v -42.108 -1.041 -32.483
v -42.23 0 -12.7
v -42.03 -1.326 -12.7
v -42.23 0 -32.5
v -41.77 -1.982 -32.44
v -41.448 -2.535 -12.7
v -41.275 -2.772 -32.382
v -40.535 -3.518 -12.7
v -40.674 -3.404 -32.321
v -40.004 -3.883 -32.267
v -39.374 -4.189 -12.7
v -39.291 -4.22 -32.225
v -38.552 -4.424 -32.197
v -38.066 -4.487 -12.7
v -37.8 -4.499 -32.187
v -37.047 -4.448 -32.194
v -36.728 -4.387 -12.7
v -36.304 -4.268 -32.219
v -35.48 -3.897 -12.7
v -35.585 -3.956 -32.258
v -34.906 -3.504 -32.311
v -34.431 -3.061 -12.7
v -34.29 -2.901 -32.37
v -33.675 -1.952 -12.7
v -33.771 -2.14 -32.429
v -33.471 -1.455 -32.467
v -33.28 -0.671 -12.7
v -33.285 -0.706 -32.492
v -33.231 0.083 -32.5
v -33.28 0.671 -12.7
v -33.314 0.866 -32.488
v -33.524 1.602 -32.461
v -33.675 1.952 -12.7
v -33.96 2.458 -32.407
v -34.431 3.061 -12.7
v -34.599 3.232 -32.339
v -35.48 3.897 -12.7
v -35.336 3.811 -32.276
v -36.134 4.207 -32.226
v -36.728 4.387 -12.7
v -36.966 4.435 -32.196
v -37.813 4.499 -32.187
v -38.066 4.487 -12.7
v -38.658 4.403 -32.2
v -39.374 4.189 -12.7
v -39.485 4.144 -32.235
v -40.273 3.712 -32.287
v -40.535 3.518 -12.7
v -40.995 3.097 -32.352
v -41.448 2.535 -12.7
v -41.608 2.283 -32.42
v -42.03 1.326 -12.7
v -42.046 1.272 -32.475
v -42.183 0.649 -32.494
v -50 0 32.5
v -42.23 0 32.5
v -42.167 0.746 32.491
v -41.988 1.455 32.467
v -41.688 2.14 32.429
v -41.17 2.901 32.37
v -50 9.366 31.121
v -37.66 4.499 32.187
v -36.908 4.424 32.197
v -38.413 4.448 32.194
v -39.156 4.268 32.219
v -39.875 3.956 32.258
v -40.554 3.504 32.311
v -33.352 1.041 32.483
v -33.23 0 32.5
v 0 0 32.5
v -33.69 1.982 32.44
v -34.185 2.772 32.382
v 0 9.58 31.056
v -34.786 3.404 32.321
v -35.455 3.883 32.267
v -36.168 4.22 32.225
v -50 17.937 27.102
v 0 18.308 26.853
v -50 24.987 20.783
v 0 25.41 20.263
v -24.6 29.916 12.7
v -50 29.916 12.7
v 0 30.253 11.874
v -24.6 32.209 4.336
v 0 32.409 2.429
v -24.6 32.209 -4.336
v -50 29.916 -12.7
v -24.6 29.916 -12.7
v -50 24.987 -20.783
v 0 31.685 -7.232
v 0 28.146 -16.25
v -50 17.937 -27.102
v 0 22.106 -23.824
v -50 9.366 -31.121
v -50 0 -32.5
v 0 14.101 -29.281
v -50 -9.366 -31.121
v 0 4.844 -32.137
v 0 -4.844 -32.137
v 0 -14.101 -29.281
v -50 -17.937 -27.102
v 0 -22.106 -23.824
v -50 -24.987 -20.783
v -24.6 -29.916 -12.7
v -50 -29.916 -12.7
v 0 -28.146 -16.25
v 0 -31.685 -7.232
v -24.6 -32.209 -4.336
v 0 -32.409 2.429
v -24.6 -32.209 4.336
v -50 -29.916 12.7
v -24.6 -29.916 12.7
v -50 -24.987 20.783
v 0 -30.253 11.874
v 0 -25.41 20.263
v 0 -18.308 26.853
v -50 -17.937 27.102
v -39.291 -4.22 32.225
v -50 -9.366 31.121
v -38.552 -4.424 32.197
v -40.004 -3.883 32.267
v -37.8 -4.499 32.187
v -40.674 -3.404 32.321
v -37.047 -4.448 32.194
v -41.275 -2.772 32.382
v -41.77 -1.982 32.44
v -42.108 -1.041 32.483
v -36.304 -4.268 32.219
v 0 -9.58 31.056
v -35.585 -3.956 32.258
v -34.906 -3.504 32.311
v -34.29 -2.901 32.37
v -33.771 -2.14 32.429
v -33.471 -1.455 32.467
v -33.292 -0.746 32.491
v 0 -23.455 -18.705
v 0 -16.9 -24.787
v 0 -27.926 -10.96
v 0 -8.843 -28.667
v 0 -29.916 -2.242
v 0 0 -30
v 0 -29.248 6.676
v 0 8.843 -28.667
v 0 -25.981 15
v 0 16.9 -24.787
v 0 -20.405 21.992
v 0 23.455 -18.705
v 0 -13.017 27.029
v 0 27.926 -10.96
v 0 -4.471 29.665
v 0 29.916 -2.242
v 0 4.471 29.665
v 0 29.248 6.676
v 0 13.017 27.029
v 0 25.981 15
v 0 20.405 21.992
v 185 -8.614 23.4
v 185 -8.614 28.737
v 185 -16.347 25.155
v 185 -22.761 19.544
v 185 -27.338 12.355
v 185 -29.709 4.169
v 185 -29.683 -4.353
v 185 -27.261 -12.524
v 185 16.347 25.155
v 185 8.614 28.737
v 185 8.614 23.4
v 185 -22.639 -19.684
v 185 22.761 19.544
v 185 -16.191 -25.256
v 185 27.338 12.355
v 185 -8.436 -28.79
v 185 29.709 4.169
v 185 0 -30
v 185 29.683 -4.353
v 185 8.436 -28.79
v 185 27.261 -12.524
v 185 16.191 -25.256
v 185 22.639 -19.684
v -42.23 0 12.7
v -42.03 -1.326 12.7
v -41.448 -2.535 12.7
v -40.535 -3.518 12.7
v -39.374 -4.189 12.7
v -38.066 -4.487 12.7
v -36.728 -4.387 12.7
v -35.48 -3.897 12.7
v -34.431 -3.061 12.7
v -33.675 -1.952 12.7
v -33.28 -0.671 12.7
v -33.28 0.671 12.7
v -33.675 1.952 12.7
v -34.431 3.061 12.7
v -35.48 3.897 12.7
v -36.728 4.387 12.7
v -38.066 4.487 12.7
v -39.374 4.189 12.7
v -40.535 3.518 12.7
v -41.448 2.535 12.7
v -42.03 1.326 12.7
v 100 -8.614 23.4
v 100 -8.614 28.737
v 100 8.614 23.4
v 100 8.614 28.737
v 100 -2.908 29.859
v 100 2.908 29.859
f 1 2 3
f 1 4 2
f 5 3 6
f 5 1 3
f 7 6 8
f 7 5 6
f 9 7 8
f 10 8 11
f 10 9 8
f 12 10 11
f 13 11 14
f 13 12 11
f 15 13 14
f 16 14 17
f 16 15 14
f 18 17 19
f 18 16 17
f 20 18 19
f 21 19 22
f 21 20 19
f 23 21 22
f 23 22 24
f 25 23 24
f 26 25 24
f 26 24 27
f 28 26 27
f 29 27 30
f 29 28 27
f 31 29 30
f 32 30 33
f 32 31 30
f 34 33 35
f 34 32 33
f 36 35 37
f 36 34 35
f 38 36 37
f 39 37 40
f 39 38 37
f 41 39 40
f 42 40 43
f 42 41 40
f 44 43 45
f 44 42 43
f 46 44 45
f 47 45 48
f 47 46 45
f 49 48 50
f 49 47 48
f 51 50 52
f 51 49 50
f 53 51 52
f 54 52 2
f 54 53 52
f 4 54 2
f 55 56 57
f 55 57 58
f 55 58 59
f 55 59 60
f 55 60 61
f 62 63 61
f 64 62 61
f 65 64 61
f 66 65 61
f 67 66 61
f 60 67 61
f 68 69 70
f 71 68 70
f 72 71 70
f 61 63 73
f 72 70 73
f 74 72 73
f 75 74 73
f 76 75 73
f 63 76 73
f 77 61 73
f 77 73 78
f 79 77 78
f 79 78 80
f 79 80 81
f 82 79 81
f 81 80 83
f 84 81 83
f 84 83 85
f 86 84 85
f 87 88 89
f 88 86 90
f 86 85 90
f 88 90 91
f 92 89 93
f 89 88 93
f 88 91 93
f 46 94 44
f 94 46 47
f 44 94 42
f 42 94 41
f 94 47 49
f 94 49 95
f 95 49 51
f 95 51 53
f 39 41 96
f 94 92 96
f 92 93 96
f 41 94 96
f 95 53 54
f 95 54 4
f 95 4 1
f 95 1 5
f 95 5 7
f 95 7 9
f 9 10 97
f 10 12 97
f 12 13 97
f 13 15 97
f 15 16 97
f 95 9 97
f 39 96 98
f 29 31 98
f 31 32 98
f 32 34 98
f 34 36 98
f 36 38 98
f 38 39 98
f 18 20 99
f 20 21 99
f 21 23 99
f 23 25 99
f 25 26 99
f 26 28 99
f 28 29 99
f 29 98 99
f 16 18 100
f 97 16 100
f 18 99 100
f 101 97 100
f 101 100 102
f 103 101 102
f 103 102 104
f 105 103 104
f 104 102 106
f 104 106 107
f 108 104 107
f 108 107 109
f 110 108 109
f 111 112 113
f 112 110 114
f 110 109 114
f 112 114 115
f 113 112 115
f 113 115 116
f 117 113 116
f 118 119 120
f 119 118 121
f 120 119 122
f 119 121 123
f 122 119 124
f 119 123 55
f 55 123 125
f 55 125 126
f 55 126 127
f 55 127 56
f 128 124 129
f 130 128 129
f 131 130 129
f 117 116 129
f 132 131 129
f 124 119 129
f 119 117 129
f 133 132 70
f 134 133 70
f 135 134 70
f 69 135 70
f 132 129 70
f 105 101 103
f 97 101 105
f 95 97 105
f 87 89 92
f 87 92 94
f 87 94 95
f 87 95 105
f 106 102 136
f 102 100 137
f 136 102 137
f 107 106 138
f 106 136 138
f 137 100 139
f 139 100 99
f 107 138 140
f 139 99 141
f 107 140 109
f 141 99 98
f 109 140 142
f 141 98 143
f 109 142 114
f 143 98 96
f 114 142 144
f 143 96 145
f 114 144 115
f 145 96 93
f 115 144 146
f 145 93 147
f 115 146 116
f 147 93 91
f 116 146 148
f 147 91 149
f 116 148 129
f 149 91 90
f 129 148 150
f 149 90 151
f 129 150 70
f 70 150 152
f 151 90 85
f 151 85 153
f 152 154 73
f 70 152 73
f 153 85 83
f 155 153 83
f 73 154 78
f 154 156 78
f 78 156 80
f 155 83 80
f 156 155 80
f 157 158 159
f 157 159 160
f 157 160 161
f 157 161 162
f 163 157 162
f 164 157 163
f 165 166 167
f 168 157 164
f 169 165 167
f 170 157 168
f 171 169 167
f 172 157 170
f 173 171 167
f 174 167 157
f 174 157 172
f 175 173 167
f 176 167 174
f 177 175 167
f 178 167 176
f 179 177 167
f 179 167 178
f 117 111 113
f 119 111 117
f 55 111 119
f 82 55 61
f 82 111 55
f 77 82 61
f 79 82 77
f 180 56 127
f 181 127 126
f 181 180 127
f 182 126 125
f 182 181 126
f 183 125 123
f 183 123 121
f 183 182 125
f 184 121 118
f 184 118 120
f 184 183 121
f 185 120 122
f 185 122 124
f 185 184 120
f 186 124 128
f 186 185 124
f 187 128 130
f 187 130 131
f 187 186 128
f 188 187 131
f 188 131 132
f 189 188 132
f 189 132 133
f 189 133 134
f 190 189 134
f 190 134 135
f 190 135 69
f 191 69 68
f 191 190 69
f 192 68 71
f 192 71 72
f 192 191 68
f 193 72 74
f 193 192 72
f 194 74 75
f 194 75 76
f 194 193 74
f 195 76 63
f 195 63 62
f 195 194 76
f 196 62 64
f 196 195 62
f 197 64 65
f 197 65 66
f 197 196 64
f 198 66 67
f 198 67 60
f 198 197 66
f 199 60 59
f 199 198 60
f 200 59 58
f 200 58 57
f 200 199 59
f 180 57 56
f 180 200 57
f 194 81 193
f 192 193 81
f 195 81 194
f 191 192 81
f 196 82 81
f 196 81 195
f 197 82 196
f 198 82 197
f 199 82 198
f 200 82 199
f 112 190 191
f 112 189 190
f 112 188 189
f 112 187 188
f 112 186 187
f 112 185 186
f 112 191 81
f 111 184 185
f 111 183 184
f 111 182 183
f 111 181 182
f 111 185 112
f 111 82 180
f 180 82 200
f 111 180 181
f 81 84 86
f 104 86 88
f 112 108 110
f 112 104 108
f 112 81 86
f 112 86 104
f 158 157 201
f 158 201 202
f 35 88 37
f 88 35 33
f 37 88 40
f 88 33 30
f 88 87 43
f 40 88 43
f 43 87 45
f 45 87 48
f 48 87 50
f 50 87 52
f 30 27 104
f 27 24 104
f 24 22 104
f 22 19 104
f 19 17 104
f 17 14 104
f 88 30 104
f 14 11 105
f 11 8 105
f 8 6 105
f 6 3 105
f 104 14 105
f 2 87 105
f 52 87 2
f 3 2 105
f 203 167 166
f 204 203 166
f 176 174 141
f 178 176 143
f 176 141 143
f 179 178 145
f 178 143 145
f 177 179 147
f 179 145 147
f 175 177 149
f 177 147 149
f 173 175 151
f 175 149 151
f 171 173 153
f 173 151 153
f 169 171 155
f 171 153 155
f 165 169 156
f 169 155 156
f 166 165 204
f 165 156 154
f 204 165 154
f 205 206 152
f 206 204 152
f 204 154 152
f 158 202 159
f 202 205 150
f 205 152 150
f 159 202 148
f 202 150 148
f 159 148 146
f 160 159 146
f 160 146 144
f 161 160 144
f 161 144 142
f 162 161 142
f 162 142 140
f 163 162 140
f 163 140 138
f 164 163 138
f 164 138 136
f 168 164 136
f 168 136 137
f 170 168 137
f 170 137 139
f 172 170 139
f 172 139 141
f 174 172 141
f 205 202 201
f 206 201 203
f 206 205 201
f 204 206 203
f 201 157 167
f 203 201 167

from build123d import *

# Parameters (mm, degrees)
SKETCH1_R               = 30
BOSS_EXTRUDE1_DEPTH     = 185
SKETCH2_R               = 32.5
BOSS_EXTRUDE2_DEPTH     = 50
SKETCH3_W               = 17.227034698
SKETCH3_H               = 11
CUT_EXTRUDE1_DEPTH      = 85
SKETCH6_W               = 97.129715822
SKETCH6_H               = 25.4
CUT_EXTRUDE2_DEPTH      = 25.4
CUT_EXTRUDE3_DEPTH      = 66.4
CUT_EXTRUDE3_DEPTH_BACK = 25.4
SKETCH7_R               = 4.5


with BuildPart() as part:
    # Sketch1 → Boss-Extrude1 (new body)
    with BuildSketch(Plane.YZ):
        with Locations(Location((0, 0, 0), (0, 0, 270))):
            Circle(SKETCH1_R)
    extrude(amount=BOSS_EXTRUDE1_DEPTH)

    # Sketch2 → Boss-Extrude2 (add)
    with BuildSketch(Plane.ZY):
        Circle(SKETCH2_R)
    extrude(amount=BOSS_EXTRUDE2_DEPTH)

    # Sketch3 → Cut-Extrude1 (cut)
    with BuildSketch(Plane.YZ.offset(185)):
        with Locations((0, 28.9)):
            Rectangle(SKETCH3_W, SKETCH3_H)
    extrude(amount=-CUT_EXTRUDE1_DEPTH, mode=Mode.SUBTRACT)

    # Sketch6 → Cut-Extrude2 (cut)
    with BuildSketch(Plane(origin=(-50, 0, 0), x_dir=(0, -1, 0), z_dir=(-1, 0, 0))):
        with Locations((3.400411954, 0)):
            Rectangle(SKETCH6_W, SKETCH6_H)
    extrude(amount=-CUT_EXTRUDE2_DEPTH, mode=Mode.SUBTRACT)

    # Sketch7 → Cut-Extrude3 (cut, two sides: drawn at the far end of the back side and taken through both)
    with BuildSketch(Plane.XY.offset(-12.7).offset(-CUT_EXTRUDE3_DEPTH_BACK)):
        with Locations(Location((-37.729755698, 0, 0), (0, 0, 180))):
            Circle(SKETCH7_R)
    extrude(amount=CUT_EXTRUDE3_DEPTH + CUT_EXTRUDE3_DEPTH_BACK, mode=Mode.SUBTRACT)


solid = part.part
